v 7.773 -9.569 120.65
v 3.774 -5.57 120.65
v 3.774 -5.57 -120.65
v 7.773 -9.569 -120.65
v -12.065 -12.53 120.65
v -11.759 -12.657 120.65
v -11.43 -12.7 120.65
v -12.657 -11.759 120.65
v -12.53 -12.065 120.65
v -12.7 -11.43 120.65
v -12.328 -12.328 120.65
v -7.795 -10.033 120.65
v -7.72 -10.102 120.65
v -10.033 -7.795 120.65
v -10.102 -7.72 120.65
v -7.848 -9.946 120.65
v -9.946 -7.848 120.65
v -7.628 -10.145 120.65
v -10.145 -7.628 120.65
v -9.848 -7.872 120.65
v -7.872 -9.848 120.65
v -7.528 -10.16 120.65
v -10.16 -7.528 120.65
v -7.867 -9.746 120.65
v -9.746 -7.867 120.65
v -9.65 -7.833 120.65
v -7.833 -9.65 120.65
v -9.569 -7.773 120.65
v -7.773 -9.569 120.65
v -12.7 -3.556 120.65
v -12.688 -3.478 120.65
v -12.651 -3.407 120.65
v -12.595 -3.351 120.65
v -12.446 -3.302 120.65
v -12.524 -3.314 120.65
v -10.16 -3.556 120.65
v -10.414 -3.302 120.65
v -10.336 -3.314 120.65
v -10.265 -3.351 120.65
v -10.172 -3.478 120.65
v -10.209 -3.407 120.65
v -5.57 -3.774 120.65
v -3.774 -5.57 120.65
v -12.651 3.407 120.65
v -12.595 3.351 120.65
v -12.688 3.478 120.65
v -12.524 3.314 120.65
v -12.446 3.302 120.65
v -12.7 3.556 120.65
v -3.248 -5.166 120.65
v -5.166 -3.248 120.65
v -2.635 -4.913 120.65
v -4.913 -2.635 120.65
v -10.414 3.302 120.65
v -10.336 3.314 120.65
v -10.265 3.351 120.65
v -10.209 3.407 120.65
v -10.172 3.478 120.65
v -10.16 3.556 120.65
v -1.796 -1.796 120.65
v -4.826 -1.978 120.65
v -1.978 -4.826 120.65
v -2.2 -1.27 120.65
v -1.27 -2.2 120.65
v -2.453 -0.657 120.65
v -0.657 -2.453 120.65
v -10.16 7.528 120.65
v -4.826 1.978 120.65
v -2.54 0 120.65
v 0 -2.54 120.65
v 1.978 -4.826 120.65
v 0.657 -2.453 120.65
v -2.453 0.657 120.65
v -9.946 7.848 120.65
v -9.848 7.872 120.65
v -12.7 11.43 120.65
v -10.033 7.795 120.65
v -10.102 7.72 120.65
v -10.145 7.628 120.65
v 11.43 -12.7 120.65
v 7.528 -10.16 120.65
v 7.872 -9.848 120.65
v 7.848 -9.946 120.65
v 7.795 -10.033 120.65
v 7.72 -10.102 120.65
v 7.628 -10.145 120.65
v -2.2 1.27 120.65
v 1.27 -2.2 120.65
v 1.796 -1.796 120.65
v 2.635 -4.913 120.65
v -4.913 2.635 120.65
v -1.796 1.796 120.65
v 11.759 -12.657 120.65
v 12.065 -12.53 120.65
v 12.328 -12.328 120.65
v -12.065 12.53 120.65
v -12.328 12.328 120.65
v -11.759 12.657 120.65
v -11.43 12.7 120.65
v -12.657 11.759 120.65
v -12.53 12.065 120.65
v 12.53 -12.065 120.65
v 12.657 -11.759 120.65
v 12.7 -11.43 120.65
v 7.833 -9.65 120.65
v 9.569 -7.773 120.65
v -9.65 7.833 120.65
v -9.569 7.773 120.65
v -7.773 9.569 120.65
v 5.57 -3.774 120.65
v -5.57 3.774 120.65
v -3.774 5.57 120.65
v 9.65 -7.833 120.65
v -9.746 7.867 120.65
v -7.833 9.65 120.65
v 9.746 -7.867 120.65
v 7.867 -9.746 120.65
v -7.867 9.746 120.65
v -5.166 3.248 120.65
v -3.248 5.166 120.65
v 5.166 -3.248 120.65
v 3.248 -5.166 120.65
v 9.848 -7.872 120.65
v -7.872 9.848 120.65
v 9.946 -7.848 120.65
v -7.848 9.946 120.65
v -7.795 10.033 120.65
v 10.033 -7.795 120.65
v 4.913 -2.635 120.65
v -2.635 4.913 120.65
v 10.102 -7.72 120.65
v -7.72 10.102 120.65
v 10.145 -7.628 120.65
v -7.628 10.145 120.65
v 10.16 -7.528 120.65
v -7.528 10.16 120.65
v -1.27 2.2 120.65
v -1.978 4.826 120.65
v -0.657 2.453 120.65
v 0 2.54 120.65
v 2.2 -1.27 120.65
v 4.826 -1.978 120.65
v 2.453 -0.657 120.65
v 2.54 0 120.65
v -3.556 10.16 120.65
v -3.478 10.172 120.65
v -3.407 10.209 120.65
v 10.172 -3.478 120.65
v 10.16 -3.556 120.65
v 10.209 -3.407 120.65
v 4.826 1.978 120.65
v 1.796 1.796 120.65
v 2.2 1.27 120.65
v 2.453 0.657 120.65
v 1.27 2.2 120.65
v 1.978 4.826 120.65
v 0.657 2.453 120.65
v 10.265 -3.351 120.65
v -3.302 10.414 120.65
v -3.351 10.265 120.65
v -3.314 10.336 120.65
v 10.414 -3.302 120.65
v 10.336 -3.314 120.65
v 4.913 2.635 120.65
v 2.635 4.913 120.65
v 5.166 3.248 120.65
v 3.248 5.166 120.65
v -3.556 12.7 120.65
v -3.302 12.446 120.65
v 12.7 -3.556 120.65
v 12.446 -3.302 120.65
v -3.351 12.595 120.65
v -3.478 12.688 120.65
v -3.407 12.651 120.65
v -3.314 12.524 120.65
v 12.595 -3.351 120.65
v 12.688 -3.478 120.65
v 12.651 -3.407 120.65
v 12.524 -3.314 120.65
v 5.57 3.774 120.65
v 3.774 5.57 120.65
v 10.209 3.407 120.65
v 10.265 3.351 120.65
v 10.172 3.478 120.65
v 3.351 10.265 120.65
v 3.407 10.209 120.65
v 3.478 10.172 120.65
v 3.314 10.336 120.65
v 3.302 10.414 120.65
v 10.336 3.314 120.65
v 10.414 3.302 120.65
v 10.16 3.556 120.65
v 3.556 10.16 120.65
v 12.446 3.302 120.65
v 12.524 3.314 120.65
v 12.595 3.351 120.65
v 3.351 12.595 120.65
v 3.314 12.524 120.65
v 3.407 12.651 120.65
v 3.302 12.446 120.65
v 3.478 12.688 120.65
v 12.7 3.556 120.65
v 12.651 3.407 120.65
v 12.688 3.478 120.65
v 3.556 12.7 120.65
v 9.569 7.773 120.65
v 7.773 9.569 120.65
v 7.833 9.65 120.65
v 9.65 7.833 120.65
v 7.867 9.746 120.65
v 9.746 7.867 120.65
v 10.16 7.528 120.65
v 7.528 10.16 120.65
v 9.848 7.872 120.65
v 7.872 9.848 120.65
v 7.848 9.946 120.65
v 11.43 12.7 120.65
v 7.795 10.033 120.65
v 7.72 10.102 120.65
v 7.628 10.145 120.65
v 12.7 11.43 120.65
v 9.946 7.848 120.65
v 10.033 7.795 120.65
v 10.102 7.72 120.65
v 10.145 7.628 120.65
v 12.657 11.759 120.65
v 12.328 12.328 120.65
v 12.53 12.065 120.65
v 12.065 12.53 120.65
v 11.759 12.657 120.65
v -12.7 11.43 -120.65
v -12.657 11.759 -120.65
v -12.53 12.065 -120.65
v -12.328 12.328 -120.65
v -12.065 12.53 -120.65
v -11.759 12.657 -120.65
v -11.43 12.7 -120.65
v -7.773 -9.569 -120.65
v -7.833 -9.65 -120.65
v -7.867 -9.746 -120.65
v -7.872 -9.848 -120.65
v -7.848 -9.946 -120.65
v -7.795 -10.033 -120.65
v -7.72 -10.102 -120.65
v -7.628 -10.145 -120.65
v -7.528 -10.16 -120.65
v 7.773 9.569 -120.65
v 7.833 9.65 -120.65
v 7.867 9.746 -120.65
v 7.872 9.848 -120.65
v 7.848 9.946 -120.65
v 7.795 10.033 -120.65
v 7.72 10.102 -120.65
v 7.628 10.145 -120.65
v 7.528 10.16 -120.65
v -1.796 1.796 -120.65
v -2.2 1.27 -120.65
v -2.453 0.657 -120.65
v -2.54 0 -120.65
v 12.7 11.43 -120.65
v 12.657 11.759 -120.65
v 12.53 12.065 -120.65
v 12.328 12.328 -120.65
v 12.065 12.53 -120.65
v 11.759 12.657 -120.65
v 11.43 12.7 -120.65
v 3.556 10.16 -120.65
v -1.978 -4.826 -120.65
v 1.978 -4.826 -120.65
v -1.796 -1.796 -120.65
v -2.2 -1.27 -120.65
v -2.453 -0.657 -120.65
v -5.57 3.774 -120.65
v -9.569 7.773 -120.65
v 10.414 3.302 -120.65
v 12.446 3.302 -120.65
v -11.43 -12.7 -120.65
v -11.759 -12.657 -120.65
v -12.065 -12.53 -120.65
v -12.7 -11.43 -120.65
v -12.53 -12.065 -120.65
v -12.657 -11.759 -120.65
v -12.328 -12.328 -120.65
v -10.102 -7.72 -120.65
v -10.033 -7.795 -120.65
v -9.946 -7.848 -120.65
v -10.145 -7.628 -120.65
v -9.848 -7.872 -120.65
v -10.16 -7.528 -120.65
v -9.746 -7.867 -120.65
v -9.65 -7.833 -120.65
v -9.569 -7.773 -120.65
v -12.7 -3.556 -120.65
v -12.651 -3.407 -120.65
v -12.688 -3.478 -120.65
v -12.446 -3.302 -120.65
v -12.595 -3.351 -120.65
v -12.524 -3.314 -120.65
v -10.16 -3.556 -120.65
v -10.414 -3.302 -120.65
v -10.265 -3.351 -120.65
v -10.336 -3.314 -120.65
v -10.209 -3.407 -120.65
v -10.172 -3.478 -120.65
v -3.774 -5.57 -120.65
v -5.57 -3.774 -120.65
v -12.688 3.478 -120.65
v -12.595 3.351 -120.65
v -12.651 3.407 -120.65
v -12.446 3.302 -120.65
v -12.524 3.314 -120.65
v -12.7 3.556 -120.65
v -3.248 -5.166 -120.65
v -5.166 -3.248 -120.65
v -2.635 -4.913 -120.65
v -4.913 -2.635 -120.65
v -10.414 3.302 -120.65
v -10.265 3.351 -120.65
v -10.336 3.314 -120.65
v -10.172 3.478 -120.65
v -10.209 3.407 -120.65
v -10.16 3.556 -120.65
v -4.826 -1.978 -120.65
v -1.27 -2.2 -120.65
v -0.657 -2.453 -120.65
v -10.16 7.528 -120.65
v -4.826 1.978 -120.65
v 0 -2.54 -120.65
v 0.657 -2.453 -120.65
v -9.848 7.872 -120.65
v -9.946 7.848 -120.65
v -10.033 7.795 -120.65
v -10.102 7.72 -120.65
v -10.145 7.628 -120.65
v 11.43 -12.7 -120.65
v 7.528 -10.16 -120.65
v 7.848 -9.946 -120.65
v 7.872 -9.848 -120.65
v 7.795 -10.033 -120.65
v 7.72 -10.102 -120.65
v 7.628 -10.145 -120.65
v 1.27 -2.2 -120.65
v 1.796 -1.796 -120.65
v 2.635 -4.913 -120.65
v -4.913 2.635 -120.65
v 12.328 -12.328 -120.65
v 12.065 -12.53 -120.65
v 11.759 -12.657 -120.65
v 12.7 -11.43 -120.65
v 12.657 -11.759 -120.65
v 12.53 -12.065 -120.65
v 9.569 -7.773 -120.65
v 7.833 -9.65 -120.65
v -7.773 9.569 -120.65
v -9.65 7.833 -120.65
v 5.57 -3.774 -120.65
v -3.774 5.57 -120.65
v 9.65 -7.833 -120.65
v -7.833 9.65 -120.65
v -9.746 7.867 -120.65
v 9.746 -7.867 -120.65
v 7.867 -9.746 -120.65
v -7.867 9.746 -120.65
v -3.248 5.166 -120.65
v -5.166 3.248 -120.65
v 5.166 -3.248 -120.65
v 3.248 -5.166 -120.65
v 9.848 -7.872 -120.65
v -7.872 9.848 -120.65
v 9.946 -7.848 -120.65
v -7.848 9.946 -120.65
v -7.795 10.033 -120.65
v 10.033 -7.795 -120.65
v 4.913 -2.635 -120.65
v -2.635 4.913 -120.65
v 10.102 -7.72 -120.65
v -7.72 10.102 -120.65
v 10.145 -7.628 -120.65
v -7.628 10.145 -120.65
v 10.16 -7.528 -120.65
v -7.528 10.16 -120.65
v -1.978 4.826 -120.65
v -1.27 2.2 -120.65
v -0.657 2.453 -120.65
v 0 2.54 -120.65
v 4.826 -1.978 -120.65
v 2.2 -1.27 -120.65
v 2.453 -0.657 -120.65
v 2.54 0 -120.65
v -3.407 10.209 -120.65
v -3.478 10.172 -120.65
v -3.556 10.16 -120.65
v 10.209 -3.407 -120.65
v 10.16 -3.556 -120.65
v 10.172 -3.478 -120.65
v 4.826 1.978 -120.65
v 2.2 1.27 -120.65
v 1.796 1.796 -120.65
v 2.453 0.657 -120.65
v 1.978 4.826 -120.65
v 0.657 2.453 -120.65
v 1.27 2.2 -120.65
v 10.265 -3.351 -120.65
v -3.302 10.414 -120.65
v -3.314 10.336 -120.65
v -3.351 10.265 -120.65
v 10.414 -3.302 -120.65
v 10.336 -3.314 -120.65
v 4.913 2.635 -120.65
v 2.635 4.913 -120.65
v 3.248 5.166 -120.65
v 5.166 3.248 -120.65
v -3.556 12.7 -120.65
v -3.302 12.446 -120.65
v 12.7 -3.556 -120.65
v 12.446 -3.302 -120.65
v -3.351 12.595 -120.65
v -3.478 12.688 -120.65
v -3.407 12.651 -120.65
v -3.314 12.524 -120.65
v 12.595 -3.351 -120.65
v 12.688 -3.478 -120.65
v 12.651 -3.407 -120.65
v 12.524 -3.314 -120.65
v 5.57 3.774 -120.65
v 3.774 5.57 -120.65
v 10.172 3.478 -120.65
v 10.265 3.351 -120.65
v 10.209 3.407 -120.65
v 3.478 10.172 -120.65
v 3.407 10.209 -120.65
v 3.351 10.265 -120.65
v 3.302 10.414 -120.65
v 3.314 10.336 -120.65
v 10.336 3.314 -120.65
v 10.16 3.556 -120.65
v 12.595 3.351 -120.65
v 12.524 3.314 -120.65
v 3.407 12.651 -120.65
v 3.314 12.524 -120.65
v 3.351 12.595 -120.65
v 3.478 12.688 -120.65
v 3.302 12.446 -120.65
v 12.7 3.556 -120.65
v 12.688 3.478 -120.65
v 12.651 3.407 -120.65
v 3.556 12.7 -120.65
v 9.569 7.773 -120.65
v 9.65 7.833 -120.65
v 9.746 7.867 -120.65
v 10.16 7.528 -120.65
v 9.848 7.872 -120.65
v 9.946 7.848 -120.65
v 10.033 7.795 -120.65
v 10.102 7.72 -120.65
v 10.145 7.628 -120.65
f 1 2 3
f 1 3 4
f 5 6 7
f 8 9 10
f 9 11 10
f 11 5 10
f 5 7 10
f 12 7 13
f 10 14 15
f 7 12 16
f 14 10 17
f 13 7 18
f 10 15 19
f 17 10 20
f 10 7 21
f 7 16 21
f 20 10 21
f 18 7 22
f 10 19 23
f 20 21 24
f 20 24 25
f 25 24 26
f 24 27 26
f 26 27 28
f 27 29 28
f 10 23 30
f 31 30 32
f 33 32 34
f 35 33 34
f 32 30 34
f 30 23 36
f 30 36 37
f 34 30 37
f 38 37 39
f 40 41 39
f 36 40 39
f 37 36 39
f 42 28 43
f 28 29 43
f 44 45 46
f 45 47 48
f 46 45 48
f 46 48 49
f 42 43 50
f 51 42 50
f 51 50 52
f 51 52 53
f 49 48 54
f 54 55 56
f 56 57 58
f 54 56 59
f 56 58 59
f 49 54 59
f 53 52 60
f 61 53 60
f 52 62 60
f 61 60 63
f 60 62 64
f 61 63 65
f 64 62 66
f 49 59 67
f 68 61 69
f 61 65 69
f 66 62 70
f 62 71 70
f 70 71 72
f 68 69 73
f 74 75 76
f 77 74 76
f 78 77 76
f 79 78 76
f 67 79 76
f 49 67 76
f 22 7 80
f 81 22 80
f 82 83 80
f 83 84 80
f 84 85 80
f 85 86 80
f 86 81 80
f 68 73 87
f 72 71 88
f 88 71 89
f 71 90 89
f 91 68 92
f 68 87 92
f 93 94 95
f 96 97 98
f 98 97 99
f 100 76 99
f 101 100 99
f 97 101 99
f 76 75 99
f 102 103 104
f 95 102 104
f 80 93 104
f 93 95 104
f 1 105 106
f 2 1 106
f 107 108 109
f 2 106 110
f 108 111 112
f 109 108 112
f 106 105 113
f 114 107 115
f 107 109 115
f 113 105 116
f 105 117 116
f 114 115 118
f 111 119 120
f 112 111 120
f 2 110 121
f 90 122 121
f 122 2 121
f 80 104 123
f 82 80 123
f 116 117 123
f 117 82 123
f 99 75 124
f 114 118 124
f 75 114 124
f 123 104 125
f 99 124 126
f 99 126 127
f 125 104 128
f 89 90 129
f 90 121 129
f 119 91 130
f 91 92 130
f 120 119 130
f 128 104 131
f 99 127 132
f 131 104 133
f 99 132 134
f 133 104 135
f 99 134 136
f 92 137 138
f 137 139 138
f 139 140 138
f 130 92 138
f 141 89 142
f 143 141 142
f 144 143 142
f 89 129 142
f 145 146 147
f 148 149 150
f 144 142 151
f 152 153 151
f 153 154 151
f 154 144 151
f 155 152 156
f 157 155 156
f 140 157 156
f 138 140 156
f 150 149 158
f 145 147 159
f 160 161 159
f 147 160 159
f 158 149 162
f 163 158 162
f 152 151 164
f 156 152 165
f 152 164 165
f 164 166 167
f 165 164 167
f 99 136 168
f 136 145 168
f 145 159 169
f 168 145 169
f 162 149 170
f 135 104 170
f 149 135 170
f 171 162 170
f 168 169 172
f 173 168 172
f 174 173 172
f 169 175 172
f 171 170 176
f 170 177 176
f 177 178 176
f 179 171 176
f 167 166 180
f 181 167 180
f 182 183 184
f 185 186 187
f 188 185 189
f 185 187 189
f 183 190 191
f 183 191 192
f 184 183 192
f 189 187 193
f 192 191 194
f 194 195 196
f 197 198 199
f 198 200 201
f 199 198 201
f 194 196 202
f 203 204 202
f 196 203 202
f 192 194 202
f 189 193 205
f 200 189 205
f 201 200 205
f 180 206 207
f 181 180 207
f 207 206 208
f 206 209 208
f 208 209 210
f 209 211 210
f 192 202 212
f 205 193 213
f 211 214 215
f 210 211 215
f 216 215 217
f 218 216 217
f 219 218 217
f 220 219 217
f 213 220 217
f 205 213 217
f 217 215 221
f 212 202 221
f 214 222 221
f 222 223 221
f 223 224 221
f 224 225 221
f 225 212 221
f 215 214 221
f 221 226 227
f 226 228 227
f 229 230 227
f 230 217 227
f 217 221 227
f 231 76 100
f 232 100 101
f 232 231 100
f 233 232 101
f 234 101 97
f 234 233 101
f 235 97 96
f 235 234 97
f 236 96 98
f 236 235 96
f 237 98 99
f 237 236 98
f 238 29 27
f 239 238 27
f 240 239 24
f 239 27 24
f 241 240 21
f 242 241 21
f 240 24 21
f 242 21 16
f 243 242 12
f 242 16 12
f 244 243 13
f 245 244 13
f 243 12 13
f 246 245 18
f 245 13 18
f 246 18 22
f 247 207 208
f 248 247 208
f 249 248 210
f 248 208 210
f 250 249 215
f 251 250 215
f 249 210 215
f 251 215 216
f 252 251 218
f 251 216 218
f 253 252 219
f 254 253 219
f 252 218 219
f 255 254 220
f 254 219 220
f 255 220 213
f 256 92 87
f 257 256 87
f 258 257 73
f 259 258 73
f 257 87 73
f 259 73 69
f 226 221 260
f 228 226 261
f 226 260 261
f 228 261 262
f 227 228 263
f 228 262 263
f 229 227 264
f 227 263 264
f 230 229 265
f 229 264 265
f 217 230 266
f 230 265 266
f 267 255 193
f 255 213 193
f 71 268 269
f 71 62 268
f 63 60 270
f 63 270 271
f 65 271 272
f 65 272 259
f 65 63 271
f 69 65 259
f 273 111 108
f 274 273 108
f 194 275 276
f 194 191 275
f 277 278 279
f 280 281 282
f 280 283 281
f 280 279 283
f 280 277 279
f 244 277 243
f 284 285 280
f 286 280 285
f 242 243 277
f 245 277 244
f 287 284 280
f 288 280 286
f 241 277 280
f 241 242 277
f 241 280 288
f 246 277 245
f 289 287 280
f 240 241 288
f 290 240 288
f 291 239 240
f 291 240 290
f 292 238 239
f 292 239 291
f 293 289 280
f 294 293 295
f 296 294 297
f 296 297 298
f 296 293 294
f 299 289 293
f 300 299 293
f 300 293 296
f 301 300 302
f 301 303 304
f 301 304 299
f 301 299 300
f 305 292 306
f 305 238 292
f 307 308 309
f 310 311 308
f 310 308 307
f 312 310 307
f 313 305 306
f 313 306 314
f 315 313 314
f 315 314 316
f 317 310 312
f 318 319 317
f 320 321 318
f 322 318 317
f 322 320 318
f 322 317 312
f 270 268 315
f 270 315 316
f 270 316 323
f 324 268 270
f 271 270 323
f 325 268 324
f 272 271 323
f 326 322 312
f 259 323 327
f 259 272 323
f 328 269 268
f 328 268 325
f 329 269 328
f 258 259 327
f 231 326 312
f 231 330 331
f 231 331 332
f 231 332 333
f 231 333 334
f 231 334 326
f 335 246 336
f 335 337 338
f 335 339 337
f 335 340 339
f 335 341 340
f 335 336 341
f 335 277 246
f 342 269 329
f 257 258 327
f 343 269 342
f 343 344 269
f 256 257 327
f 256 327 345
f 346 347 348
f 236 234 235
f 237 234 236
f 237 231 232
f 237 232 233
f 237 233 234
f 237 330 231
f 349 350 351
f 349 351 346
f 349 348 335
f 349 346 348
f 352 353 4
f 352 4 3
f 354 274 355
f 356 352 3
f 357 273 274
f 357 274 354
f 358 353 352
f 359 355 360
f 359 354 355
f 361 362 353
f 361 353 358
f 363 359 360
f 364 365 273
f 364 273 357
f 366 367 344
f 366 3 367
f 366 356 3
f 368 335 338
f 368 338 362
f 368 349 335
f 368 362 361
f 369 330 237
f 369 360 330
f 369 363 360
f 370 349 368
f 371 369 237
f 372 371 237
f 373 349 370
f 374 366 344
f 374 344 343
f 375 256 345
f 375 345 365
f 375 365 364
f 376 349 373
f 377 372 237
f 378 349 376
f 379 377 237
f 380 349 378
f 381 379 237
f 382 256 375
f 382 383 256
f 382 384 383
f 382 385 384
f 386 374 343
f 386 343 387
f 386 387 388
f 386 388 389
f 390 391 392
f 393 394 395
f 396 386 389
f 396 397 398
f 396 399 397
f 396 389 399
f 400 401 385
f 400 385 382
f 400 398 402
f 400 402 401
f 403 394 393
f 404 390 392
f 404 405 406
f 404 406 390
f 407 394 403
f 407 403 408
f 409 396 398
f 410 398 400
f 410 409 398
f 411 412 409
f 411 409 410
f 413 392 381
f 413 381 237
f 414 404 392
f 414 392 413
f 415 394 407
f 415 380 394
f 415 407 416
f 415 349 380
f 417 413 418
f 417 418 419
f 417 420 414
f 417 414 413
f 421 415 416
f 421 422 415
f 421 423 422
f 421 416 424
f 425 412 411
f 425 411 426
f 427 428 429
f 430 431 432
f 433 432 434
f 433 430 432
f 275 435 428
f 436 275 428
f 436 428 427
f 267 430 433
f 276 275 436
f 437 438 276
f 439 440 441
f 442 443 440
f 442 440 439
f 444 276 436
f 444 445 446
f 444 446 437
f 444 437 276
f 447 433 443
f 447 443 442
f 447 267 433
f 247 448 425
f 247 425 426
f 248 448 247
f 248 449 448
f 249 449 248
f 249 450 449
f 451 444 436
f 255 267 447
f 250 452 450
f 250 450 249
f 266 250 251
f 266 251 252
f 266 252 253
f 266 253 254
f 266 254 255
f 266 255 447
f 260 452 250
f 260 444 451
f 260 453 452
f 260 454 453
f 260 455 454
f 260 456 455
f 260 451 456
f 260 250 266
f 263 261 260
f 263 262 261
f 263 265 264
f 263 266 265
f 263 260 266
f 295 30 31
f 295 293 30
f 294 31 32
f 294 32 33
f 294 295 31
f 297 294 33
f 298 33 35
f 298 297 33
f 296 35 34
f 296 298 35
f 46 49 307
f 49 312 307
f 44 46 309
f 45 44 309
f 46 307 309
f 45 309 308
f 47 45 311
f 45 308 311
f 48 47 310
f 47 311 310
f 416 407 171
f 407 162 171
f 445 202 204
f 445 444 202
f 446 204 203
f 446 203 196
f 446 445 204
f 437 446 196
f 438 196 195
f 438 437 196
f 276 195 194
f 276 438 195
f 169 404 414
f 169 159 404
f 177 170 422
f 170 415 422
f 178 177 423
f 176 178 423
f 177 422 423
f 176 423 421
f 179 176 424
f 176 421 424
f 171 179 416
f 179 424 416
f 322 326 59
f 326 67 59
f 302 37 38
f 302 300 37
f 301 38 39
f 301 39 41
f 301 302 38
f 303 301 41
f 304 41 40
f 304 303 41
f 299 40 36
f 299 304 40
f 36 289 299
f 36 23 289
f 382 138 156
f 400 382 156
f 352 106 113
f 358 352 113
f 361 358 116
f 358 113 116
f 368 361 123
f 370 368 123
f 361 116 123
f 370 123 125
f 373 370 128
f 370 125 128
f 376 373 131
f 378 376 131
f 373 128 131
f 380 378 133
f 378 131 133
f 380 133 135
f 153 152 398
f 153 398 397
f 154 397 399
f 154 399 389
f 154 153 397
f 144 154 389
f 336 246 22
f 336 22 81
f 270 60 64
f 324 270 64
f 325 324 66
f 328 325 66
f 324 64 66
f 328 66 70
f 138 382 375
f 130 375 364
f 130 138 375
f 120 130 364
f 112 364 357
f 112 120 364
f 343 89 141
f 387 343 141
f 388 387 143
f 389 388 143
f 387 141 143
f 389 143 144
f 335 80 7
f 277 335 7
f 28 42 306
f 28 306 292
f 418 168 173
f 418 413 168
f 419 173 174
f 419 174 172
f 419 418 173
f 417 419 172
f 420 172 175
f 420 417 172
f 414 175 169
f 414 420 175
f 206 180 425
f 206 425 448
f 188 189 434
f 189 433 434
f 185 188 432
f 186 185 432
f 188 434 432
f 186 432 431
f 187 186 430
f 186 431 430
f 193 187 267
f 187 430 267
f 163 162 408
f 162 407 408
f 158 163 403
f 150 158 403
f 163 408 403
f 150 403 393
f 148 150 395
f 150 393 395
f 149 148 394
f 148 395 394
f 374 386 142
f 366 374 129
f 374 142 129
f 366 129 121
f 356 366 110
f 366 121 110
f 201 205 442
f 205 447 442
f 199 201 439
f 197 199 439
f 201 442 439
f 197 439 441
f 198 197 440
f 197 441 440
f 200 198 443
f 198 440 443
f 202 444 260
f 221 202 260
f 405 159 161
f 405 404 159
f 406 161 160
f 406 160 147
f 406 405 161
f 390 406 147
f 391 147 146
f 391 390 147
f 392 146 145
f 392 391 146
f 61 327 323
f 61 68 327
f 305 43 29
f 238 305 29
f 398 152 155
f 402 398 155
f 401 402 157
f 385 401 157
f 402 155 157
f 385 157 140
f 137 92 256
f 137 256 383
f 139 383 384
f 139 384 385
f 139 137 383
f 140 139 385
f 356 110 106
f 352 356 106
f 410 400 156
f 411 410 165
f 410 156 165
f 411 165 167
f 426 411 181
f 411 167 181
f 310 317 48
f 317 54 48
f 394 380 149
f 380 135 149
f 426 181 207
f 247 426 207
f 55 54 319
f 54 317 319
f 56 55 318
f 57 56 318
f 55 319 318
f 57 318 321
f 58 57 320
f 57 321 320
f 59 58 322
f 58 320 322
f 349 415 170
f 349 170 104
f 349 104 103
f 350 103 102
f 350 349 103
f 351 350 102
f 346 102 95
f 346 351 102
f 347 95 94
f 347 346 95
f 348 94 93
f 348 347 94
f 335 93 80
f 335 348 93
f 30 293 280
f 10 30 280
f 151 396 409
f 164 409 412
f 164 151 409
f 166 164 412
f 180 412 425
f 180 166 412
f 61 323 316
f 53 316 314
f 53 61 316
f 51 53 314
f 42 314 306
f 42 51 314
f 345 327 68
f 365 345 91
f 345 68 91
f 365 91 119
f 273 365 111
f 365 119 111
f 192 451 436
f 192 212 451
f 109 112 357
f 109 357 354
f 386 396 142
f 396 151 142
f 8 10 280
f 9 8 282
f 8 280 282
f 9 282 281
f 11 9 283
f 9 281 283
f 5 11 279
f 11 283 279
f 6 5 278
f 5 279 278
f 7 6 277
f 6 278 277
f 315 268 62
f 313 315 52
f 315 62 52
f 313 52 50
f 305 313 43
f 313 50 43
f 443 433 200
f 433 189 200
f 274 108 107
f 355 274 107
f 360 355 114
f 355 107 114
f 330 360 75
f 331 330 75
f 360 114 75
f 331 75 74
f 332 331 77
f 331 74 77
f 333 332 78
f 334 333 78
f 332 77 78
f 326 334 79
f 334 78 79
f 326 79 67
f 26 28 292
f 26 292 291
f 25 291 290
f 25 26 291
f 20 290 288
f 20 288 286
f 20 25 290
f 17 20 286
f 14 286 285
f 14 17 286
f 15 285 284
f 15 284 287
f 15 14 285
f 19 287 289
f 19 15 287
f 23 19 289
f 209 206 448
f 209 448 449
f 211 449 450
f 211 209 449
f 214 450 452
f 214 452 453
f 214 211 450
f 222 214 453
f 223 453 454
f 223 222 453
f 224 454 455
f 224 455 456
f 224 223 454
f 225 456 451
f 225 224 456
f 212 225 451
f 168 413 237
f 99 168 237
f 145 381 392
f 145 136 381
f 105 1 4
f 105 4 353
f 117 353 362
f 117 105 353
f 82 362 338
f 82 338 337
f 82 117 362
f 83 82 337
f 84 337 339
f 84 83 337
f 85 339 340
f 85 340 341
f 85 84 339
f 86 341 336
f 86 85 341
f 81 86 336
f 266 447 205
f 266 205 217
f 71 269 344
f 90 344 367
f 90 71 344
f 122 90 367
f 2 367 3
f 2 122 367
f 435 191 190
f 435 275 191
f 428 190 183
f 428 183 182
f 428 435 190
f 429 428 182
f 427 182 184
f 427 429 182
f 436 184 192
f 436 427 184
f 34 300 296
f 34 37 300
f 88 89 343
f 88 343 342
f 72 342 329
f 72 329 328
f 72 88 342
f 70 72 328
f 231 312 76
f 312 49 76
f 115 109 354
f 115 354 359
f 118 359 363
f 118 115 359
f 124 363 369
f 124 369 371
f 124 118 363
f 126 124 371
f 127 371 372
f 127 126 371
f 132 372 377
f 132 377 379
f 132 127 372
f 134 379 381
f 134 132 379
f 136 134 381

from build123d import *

# Parameters (mm, degrees)
BOSS_EXTRUDE1_DEPTH = 120.65
FILLET2_R           = 0.254
FILLET1_R           = 1.27
SKETCH5_W           = 7.112
SKETCH5_H           = 2.54
BOSS_EXTRUDE2_DEPTH = 241.3


with BuildPart() as part:
    # Sketch3 → Boss-Extrude1 (new body, symmetric)
    with BuildSketch(Plane.XY):
        with BuildLine():
            Line((-12.7, 12.7), (-1.796051224, 1.796051224))
            ThreePointArc((-1.796051224, 1.796051224), (-0.972015918, 2.346654013), (0, 2.54))
            Line((0, 2.54), (0, 4.826))
            Line((0, 4.826), (-1.977846327, 4.826))
            ThreePointArc((-1.977846327, 4.826), (-2.949862246, 5.019345987), (-3.773897552, 5.569948776))
            Line((-3.773897552, 5.569948776), (-7.772528286, 9.56857951))
            ThreePointArc((-7.772528286, 9.56857951), (-7.847628361, 9.946133082), (-7.527553898, 10.16))
            Line((-7.527553898, 10.16), (-3.302, 10.16))
            Line((-3.302, 10.16), (-3.302, 12.7))
            Line((-3.302, 12.7), (-12.7, 12.7))
        make_face()
    extrude(amount=BOSS_EXTRUDE1_DEPTH, both=True)

    # Fillet2
    fillet2_edges = [part.edges().sort_by_distance(p)[0] for p in [
        (-3.302, 12.7, 0),
        (-3.302, 10.16, 0),
    ]]
    fillet(fillet2_edges, radius=FILLET2_R)

    # Mirror1: part across plane


with BuildPart() as part_1:
    add(part.part)
    add(part.part.mirror(Plane(origin=(0, 0, 120.65), x_dir=(0, 0, 1), z_dir=(0.707106781, 0.707106781, 0))))

    # Fillet1
    fillet1_edges = [part_1.edges().sort_by_distance(p)[0] for p in [
        (-12.7, 12.7, 0),
    ]]
    fillet(fillet1_edges, radius=FILLET1_R)

    # Mirror2: part across plane


with BuildPart() as part_2:
    add(part_1.part)
    add(part_1.part.mirror(Plane(origin=(0, 0, 120.65), x_dir=(0, 0, 1), z_dir=(0, 1, 0))))

    # Mirror5: part across plane


with BuildPart() as part_3:
    add(part_2.part)
    add(part_2.part.mirror(Plane(origin=(0, 0, 120.65), x_dir=(0, 0, 1), z_dir=(-1, 0, 0))))

    # Sketch5 → Boss-Extrude2 (add, through all)
    with BuildSketch(Plane.XY.offset(120.65)):
        with Locations((0, -11.43)):
            Rectangle(SKETCH5_W, SKETCH5_H)
    extrude(amount=-BOSS_EXTRUDE2_DEPTH)


solid = part_3.part
